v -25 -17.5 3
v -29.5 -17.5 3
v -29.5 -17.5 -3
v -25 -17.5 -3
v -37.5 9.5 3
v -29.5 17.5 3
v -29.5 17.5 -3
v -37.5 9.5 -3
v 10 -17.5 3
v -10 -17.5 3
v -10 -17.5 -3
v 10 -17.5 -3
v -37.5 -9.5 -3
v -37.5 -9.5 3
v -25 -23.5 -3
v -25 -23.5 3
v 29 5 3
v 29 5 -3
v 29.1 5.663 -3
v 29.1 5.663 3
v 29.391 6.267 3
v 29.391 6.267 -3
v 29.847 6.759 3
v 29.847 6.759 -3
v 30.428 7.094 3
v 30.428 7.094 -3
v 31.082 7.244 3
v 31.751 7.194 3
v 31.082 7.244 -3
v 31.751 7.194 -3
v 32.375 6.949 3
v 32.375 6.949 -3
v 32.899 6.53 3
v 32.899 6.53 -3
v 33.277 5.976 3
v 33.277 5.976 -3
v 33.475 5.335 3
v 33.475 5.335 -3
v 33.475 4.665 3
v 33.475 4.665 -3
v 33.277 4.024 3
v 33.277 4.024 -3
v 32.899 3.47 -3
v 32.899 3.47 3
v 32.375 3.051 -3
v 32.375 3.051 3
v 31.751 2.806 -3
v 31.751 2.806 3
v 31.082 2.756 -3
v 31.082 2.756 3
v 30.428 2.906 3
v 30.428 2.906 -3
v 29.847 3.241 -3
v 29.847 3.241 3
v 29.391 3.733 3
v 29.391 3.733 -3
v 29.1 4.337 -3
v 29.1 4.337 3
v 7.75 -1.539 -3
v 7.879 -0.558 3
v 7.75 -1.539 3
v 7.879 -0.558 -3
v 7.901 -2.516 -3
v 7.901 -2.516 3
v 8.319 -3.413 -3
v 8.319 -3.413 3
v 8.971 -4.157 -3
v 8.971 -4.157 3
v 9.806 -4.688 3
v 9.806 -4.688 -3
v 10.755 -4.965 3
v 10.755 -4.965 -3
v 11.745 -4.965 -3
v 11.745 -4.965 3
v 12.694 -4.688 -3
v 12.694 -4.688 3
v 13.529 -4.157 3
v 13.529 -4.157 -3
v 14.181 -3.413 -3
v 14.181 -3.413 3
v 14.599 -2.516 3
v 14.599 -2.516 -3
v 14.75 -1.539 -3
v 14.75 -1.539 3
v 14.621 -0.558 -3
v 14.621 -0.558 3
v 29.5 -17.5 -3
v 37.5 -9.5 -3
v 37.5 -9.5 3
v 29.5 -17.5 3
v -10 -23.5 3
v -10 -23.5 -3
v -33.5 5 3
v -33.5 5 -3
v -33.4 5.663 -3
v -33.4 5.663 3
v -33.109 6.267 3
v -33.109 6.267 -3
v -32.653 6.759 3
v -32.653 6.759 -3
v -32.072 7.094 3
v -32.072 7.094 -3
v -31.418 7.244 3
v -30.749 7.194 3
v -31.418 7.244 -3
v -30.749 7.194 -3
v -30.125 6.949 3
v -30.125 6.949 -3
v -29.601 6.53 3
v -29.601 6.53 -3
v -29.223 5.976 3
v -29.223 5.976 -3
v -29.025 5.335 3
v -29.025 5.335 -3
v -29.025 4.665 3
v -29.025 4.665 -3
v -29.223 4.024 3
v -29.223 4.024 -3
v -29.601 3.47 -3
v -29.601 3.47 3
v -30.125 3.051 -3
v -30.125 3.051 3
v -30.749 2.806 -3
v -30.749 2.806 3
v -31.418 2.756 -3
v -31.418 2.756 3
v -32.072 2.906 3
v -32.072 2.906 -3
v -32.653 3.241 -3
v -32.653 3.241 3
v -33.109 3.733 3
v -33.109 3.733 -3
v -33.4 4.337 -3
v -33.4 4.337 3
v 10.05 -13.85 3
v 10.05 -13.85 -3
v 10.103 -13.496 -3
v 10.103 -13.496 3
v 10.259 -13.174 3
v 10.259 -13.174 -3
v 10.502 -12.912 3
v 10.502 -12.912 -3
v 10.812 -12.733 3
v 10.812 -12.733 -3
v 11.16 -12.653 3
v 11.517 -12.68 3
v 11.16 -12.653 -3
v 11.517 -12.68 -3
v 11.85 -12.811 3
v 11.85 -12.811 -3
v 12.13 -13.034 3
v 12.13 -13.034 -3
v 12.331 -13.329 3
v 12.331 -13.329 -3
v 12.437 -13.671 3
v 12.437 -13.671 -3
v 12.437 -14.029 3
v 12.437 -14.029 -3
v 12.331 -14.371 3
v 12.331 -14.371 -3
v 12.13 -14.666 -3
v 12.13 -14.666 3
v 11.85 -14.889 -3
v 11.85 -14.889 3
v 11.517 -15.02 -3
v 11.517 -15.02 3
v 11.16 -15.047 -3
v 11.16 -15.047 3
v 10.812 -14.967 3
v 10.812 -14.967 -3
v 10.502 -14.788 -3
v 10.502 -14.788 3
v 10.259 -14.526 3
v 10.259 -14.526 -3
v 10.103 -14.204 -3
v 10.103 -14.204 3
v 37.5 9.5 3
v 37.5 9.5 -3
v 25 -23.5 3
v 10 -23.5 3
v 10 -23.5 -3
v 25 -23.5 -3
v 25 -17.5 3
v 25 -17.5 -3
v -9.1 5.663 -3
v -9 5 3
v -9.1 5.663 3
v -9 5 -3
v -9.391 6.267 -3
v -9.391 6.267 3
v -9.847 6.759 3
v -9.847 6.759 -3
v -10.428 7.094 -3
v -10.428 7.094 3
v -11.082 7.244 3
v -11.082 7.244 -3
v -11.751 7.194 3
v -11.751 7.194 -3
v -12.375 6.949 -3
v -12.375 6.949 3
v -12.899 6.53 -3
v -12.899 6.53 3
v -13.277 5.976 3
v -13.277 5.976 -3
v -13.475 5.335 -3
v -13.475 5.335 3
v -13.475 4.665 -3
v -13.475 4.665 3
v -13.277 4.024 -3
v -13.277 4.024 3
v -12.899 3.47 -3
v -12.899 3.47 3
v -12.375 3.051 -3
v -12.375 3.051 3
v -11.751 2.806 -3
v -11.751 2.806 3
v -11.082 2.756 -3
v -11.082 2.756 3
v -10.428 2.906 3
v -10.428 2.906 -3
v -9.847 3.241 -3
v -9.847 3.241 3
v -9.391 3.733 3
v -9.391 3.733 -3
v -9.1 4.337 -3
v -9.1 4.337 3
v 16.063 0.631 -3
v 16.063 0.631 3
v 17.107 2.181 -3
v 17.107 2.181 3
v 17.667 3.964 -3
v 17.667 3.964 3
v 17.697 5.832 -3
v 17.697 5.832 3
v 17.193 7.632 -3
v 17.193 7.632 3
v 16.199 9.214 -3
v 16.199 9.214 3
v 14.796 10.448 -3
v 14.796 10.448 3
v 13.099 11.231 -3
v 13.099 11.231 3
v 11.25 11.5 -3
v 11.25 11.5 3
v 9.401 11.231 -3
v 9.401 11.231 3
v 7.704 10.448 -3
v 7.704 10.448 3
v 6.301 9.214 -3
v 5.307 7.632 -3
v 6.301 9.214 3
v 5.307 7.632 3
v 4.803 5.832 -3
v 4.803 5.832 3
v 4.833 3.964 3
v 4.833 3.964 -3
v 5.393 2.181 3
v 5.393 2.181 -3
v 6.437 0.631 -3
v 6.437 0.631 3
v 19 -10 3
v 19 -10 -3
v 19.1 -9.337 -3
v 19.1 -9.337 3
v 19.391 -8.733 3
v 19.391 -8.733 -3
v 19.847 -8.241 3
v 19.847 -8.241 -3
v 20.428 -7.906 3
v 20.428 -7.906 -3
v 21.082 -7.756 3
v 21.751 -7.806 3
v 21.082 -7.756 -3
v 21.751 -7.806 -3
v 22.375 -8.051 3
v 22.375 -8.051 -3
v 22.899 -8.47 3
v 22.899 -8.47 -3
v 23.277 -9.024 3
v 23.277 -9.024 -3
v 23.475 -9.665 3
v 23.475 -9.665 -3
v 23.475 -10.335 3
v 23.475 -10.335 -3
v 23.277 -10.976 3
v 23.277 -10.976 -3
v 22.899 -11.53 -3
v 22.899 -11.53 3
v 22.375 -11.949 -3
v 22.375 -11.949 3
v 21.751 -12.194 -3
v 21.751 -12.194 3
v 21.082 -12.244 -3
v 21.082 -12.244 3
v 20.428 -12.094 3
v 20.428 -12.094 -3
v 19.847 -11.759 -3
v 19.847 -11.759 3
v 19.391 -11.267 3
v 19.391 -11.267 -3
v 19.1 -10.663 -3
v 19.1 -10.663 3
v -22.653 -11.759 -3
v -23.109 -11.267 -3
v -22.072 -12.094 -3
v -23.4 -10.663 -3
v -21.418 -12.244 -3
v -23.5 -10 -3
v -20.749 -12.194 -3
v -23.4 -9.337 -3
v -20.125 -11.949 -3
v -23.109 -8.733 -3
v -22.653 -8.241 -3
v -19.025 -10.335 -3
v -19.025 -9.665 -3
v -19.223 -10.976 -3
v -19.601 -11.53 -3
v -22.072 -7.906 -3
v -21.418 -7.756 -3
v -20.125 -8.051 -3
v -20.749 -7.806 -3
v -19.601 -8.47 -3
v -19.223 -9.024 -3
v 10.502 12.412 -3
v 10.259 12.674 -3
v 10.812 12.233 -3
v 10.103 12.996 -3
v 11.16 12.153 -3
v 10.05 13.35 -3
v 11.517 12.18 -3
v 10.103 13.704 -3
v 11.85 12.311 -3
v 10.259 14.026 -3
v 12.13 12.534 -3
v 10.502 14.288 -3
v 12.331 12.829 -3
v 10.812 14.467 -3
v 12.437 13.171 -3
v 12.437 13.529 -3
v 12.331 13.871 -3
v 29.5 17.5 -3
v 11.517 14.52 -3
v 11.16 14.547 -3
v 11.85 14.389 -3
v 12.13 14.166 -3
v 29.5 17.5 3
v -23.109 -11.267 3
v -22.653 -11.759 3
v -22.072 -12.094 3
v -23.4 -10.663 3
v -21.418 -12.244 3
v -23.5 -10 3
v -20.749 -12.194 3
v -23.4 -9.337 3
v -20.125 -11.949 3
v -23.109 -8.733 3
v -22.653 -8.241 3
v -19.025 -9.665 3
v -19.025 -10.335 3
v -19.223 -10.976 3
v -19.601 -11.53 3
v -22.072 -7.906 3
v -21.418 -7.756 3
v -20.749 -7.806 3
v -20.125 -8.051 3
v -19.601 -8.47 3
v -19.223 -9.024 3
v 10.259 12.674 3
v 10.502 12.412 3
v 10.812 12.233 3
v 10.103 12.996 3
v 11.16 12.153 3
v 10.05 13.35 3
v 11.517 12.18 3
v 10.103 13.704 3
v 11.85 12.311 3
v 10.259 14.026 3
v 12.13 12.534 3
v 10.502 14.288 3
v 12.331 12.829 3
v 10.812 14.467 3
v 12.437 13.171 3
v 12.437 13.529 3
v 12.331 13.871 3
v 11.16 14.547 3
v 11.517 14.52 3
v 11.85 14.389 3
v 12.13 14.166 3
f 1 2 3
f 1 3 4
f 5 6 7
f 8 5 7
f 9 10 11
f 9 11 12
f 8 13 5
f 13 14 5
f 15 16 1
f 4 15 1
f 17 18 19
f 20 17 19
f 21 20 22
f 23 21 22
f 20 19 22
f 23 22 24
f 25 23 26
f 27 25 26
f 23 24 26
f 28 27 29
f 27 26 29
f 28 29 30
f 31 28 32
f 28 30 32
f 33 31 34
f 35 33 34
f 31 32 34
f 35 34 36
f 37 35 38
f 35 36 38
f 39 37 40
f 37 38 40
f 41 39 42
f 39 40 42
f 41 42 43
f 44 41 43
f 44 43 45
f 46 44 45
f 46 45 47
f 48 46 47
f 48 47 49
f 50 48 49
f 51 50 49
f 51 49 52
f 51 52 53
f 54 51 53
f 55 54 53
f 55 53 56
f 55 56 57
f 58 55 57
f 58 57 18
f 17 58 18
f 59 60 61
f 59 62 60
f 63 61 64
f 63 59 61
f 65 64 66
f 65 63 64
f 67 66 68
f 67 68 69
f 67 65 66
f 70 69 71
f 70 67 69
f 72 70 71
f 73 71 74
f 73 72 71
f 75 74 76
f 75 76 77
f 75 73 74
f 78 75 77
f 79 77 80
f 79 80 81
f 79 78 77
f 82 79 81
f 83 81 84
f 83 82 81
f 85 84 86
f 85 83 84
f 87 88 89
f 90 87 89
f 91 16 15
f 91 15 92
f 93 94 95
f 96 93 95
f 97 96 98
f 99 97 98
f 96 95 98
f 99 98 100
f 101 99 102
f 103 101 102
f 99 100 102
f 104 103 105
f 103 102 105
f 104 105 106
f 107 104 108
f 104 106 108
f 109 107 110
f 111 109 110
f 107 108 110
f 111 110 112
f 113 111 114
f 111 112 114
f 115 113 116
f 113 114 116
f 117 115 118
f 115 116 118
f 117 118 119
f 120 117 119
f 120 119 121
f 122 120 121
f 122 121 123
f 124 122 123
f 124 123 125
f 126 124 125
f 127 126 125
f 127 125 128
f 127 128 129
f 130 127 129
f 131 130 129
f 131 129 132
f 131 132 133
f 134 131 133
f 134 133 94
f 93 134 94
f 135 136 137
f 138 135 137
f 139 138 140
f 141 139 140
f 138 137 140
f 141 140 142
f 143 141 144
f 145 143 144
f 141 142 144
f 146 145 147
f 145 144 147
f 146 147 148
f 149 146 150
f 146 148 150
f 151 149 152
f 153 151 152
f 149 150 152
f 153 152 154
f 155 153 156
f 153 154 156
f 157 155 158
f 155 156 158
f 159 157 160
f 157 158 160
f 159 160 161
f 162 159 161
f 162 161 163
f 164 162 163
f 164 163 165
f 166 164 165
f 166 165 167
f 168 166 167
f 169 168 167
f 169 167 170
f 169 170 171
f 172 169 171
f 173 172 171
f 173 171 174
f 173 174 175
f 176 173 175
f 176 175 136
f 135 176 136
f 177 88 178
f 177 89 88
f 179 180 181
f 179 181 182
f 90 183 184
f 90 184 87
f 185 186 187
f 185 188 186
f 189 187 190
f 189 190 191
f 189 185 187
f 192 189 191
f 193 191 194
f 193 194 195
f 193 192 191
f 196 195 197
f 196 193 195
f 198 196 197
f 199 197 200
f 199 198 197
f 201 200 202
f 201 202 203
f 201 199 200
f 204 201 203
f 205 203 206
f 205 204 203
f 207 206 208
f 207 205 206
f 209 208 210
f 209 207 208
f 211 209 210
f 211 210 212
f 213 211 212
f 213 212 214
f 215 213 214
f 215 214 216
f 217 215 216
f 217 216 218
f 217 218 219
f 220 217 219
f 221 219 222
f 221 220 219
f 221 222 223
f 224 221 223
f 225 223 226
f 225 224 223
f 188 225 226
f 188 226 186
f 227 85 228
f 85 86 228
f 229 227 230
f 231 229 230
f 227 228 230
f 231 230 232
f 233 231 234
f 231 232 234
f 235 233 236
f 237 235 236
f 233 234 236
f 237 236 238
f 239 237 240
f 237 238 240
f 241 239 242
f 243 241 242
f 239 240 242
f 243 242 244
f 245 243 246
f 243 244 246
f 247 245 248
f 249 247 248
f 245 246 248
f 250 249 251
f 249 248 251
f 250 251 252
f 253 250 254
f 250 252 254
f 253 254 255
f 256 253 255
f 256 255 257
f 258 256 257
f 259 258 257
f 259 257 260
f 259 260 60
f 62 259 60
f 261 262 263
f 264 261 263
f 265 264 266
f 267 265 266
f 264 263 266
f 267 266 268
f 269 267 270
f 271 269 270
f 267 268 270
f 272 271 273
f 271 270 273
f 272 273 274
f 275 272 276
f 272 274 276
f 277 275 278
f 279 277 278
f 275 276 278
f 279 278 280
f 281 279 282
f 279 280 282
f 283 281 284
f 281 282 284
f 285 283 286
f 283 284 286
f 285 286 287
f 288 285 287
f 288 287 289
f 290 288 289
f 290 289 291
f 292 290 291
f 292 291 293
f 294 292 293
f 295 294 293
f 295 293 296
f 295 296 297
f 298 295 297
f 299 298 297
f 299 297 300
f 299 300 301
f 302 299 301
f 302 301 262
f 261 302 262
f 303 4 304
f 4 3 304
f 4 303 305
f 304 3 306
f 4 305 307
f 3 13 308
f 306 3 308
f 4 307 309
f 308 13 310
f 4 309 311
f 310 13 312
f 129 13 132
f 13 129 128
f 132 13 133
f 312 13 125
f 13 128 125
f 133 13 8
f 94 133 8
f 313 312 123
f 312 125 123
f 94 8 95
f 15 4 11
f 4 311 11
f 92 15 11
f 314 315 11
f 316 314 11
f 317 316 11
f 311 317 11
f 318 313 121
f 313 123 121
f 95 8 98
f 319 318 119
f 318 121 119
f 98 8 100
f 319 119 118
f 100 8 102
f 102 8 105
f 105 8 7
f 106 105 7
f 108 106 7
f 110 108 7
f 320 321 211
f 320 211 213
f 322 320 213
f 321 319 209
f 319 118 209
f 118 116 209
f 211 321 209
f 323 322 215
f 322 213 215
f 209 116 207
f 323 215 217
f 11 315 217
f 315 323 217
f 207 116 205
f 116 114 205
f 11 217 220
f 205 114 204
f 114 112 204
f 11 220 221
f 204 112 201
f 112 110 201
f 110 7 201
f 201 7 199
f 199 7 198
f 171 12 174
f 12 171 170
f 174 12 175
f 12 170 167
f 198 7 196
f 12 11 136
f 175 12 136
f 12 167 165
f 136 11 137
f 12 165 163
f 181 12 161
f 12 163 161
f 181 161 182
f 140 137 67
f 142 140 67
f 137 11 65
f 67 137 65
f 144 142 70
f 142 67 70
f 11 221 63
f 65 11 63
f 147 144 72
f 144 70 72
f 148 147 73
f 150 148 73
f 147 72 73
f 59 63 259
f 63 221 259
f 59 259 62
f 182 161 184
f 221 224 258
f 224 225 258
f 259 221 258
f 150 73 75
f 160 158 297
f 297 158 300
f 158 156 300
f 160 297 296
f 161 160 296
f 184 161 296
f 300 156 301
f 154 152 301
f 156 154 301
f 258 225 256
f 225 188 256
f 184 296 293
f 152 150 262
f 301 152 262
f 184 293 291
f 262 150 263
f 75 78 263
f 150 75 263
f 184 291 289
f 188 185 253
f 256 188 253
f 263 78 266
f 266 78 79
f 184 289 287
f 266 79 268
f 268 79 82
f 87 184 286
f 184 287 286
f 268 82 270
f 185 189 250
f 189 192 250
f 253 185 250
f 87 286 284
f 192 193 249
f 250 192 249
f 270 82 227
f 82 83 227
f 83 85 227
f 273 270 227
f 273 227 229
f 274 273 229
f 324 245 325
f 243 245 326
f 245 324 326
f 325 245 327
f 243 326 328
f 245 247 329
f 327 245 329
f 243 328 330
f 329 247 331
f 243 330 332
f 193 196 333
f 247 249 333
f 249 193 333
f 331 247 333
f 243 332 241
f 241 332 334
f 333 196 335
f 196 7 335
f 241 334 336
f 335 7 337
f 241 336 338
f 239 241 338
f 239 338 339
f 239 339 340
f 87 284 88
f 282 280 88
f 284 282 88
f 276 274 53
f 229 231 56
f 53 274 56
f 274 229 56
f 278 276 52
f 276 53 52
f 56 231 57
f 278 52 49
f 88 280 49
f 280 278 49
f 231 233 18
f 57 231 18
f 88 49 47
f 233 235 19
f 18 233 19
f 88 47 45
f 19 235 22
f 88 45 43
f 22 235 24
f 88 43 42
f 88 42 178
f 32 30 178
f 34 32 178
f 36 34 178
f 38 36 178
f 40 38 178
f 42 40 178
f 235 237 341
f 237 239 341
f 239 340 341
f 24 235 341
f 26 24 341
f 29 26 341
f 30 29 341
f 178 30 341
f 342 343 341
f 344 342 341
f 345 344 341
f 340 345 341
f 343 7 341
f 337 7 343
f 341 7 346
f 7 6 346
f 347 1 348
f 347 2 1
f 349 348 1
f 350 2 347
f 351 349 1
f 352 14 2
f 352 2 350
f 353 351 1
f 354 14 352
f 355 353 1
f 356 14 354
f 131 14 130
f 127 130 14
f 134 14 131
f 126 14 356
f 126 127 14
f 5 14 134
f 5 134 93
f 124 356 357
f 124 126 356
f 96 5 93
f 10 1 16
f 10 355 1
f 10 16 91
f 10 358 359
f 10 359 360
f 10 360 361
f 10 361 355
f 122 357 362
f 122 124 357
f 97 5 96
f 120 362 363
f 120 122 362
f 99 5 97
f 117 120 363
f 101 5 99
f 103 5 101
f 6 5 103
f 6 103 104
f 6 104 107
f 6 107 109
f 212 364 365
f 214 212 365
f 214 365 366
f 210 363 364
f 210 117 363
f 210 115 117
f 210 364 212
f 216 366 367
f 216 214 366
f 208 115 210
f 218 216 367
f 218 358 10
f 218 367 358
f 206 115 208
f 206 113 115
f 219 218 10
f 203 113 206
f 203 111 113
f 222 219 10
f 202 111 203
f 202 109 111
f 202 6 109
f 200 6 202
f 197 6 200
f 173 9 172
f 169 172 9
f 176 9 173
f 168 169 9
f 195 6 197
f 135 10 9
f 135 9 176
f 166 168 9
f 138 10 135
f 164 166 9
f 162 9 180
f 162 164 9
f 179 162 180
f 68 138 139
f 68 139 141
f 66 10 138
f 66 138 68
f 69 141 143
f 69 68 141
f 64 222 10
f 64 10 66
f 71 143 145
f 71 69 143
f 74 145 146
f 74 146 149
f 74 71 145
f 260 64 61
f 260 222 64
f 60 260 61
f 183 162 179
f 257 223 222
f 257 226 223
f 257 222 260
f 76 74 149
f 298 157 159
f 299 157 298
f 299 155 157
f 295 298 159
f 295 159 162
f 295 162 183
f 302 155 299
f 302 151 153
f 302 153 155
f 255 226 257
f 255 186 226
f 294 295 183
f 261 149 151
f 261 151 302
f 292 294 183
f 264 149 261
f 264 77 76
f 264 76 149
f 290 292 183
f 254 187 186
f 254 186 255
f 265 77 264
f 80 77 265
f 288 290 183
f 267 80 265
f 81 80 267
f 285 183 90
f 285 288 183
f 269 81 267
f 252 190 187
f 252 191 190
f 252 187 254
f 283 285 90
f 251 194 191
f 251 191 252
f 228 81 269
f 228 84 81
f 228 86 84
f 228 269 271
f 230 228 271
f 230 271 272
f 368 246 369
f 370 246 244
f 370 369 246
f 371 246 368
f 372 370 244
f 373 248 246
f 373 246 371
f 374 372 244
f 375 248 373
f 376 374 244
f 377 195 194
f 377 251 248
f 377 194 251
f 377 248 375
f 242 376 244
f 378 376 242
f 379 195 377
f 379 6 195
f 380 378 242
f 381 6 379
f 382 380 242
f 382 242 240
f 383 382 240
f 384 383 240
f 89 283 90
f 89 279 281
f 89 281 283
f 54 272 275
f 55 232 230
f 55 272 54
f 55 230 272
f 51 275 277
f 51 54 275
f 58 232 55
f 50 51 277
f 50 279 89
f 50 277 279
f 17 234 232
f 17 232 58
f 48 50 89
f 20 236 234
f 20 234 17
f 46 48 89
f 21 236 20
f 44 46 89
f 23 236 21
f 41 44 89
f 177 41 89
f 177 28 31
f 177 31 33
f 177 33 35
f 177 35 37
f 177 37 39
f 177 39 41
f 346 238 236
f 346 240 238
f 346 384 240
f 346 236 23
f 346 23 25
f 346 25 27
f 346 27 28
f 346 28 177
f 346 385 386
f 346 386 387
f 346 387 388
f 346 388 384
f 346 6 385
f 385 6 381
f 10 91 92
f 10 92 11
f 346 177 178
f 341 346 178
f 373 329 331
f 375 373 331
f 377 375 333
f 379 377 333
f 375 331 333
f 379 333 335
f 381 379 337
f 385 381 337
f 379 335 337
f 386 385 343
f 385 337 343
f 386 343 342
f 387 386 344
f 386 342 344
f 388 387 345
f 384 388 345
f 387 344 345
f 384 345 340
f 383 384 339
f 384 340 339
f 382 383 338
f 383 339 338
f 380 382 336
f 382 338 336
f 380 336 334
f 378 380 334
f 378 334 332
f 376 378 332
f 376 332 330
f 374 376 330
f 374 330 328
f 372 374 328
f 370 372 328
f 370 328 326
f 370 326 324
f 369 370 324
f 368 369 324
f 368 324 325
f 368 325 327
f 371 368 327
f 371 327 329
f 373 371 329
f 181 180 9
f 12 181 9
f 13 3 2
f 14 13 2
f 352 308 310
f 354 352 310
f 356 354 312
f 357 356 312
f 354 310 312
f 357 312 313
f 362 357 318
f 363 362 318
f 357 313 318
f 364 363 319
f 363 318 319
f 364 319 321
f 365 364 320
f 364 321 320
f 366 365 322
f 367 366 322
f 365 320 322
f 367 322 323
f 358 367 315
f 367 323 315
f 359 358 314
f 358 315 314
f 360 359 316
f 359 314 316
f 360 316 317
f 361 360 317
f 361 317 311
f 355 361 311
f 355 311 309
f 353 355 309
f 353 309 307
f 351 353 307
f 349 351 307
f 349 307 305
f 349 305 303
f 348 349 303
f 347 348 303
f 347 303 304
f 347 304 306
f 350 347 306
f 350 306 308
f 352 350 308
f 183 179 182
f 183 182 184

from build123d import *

# Parameters (mm, degrees)
CROQUIS1_W                   = 75
CROQUIS1_H                   = 35
CROQUIS1_R                   = 2.25
SALIENTE_EXTRUIR1_DEPTH      = 3
TALADRO_DE_MARGEN_PARA_M41_D = 4.5
TALADRO_DE_MARGEN_PARA_M21_D = 2.4
CROQUIS6_W                   = 15
CROQUIS6_H                   = 6
SALIENTE_EXTRUIR2_DEPTH      = 6
REDONDEO1_SIZE               = 8


with BuildPart() as part:
    # Croquis1 → Saliente-Extruir1 (new, symmetric)
    with BuildSketch(Plane.XY):
        Rectangle(CROQUIS1_W, CROQUIS1_H)
        with Locations((-11.25, 5)):
            Circle(CROQUIS1_R, mode=Mode.SUBTRACT)
        with BuildLine():
            ThreePointArc((14.62076493, -0.557692308), (11.25, 11.5), (7.87923507, -0.557692308))
            ThreePointArc((7.87923507, -0.557692308), (11.25, -5), (14.62076493, -0.557692308))
        make_face(mode=Mode.SUBTRACT)
    extrude(amount=SALIENTE_EXTRUIR1_DEPTH, both=True)

    # Taladro de margen para M41 (through all)
    with Locations(Plane.XY.offset(3)):
        with Locations((-31.25, 5), (31.25, 5), (21.25, -10), (-21.25, -10)):
            Hole(TALADRO_DE_MARGEN_PARA_M41_D / 2)

    # Taladro de margen para M21 (through all)
    with Locations(Plane.XY.offset(3)):
        with Locations((11.25, 13.35), (11.25, -13.85)):
            Hole(TALADRO_DE_MARGEN_PARA_M21_D / 2)

    # Croquis6 → Saliente-Extruir2 (add, through all)
    with BuildSketch(Plane.XY.offset(3)):
        with Locations((-17.5, -20.5)):
            Rectangle(CROQUIS6_W, CROQUIS6_H)
        with Locations((17.5, -20.5)):
            Rectangle(CROQUIS6_W, CROQUIS6_H)
    extrude(amount=-SALIENTE_EXTRUIR2_DEPTH)

    # Redondeo1
    redondeo1_edges = [part.edges().sort_by_distance(p)[0] for p in [
        (-37.5, 17.5, 0),
        (37.5, 17.5, 0),
        (37.5, -17.5, 0),
        (-37.5, -17.5, 0),
    ]]
    chamfer(redondeo1_edges, length=REDONDEO1_SIZE)


solid = part.part
